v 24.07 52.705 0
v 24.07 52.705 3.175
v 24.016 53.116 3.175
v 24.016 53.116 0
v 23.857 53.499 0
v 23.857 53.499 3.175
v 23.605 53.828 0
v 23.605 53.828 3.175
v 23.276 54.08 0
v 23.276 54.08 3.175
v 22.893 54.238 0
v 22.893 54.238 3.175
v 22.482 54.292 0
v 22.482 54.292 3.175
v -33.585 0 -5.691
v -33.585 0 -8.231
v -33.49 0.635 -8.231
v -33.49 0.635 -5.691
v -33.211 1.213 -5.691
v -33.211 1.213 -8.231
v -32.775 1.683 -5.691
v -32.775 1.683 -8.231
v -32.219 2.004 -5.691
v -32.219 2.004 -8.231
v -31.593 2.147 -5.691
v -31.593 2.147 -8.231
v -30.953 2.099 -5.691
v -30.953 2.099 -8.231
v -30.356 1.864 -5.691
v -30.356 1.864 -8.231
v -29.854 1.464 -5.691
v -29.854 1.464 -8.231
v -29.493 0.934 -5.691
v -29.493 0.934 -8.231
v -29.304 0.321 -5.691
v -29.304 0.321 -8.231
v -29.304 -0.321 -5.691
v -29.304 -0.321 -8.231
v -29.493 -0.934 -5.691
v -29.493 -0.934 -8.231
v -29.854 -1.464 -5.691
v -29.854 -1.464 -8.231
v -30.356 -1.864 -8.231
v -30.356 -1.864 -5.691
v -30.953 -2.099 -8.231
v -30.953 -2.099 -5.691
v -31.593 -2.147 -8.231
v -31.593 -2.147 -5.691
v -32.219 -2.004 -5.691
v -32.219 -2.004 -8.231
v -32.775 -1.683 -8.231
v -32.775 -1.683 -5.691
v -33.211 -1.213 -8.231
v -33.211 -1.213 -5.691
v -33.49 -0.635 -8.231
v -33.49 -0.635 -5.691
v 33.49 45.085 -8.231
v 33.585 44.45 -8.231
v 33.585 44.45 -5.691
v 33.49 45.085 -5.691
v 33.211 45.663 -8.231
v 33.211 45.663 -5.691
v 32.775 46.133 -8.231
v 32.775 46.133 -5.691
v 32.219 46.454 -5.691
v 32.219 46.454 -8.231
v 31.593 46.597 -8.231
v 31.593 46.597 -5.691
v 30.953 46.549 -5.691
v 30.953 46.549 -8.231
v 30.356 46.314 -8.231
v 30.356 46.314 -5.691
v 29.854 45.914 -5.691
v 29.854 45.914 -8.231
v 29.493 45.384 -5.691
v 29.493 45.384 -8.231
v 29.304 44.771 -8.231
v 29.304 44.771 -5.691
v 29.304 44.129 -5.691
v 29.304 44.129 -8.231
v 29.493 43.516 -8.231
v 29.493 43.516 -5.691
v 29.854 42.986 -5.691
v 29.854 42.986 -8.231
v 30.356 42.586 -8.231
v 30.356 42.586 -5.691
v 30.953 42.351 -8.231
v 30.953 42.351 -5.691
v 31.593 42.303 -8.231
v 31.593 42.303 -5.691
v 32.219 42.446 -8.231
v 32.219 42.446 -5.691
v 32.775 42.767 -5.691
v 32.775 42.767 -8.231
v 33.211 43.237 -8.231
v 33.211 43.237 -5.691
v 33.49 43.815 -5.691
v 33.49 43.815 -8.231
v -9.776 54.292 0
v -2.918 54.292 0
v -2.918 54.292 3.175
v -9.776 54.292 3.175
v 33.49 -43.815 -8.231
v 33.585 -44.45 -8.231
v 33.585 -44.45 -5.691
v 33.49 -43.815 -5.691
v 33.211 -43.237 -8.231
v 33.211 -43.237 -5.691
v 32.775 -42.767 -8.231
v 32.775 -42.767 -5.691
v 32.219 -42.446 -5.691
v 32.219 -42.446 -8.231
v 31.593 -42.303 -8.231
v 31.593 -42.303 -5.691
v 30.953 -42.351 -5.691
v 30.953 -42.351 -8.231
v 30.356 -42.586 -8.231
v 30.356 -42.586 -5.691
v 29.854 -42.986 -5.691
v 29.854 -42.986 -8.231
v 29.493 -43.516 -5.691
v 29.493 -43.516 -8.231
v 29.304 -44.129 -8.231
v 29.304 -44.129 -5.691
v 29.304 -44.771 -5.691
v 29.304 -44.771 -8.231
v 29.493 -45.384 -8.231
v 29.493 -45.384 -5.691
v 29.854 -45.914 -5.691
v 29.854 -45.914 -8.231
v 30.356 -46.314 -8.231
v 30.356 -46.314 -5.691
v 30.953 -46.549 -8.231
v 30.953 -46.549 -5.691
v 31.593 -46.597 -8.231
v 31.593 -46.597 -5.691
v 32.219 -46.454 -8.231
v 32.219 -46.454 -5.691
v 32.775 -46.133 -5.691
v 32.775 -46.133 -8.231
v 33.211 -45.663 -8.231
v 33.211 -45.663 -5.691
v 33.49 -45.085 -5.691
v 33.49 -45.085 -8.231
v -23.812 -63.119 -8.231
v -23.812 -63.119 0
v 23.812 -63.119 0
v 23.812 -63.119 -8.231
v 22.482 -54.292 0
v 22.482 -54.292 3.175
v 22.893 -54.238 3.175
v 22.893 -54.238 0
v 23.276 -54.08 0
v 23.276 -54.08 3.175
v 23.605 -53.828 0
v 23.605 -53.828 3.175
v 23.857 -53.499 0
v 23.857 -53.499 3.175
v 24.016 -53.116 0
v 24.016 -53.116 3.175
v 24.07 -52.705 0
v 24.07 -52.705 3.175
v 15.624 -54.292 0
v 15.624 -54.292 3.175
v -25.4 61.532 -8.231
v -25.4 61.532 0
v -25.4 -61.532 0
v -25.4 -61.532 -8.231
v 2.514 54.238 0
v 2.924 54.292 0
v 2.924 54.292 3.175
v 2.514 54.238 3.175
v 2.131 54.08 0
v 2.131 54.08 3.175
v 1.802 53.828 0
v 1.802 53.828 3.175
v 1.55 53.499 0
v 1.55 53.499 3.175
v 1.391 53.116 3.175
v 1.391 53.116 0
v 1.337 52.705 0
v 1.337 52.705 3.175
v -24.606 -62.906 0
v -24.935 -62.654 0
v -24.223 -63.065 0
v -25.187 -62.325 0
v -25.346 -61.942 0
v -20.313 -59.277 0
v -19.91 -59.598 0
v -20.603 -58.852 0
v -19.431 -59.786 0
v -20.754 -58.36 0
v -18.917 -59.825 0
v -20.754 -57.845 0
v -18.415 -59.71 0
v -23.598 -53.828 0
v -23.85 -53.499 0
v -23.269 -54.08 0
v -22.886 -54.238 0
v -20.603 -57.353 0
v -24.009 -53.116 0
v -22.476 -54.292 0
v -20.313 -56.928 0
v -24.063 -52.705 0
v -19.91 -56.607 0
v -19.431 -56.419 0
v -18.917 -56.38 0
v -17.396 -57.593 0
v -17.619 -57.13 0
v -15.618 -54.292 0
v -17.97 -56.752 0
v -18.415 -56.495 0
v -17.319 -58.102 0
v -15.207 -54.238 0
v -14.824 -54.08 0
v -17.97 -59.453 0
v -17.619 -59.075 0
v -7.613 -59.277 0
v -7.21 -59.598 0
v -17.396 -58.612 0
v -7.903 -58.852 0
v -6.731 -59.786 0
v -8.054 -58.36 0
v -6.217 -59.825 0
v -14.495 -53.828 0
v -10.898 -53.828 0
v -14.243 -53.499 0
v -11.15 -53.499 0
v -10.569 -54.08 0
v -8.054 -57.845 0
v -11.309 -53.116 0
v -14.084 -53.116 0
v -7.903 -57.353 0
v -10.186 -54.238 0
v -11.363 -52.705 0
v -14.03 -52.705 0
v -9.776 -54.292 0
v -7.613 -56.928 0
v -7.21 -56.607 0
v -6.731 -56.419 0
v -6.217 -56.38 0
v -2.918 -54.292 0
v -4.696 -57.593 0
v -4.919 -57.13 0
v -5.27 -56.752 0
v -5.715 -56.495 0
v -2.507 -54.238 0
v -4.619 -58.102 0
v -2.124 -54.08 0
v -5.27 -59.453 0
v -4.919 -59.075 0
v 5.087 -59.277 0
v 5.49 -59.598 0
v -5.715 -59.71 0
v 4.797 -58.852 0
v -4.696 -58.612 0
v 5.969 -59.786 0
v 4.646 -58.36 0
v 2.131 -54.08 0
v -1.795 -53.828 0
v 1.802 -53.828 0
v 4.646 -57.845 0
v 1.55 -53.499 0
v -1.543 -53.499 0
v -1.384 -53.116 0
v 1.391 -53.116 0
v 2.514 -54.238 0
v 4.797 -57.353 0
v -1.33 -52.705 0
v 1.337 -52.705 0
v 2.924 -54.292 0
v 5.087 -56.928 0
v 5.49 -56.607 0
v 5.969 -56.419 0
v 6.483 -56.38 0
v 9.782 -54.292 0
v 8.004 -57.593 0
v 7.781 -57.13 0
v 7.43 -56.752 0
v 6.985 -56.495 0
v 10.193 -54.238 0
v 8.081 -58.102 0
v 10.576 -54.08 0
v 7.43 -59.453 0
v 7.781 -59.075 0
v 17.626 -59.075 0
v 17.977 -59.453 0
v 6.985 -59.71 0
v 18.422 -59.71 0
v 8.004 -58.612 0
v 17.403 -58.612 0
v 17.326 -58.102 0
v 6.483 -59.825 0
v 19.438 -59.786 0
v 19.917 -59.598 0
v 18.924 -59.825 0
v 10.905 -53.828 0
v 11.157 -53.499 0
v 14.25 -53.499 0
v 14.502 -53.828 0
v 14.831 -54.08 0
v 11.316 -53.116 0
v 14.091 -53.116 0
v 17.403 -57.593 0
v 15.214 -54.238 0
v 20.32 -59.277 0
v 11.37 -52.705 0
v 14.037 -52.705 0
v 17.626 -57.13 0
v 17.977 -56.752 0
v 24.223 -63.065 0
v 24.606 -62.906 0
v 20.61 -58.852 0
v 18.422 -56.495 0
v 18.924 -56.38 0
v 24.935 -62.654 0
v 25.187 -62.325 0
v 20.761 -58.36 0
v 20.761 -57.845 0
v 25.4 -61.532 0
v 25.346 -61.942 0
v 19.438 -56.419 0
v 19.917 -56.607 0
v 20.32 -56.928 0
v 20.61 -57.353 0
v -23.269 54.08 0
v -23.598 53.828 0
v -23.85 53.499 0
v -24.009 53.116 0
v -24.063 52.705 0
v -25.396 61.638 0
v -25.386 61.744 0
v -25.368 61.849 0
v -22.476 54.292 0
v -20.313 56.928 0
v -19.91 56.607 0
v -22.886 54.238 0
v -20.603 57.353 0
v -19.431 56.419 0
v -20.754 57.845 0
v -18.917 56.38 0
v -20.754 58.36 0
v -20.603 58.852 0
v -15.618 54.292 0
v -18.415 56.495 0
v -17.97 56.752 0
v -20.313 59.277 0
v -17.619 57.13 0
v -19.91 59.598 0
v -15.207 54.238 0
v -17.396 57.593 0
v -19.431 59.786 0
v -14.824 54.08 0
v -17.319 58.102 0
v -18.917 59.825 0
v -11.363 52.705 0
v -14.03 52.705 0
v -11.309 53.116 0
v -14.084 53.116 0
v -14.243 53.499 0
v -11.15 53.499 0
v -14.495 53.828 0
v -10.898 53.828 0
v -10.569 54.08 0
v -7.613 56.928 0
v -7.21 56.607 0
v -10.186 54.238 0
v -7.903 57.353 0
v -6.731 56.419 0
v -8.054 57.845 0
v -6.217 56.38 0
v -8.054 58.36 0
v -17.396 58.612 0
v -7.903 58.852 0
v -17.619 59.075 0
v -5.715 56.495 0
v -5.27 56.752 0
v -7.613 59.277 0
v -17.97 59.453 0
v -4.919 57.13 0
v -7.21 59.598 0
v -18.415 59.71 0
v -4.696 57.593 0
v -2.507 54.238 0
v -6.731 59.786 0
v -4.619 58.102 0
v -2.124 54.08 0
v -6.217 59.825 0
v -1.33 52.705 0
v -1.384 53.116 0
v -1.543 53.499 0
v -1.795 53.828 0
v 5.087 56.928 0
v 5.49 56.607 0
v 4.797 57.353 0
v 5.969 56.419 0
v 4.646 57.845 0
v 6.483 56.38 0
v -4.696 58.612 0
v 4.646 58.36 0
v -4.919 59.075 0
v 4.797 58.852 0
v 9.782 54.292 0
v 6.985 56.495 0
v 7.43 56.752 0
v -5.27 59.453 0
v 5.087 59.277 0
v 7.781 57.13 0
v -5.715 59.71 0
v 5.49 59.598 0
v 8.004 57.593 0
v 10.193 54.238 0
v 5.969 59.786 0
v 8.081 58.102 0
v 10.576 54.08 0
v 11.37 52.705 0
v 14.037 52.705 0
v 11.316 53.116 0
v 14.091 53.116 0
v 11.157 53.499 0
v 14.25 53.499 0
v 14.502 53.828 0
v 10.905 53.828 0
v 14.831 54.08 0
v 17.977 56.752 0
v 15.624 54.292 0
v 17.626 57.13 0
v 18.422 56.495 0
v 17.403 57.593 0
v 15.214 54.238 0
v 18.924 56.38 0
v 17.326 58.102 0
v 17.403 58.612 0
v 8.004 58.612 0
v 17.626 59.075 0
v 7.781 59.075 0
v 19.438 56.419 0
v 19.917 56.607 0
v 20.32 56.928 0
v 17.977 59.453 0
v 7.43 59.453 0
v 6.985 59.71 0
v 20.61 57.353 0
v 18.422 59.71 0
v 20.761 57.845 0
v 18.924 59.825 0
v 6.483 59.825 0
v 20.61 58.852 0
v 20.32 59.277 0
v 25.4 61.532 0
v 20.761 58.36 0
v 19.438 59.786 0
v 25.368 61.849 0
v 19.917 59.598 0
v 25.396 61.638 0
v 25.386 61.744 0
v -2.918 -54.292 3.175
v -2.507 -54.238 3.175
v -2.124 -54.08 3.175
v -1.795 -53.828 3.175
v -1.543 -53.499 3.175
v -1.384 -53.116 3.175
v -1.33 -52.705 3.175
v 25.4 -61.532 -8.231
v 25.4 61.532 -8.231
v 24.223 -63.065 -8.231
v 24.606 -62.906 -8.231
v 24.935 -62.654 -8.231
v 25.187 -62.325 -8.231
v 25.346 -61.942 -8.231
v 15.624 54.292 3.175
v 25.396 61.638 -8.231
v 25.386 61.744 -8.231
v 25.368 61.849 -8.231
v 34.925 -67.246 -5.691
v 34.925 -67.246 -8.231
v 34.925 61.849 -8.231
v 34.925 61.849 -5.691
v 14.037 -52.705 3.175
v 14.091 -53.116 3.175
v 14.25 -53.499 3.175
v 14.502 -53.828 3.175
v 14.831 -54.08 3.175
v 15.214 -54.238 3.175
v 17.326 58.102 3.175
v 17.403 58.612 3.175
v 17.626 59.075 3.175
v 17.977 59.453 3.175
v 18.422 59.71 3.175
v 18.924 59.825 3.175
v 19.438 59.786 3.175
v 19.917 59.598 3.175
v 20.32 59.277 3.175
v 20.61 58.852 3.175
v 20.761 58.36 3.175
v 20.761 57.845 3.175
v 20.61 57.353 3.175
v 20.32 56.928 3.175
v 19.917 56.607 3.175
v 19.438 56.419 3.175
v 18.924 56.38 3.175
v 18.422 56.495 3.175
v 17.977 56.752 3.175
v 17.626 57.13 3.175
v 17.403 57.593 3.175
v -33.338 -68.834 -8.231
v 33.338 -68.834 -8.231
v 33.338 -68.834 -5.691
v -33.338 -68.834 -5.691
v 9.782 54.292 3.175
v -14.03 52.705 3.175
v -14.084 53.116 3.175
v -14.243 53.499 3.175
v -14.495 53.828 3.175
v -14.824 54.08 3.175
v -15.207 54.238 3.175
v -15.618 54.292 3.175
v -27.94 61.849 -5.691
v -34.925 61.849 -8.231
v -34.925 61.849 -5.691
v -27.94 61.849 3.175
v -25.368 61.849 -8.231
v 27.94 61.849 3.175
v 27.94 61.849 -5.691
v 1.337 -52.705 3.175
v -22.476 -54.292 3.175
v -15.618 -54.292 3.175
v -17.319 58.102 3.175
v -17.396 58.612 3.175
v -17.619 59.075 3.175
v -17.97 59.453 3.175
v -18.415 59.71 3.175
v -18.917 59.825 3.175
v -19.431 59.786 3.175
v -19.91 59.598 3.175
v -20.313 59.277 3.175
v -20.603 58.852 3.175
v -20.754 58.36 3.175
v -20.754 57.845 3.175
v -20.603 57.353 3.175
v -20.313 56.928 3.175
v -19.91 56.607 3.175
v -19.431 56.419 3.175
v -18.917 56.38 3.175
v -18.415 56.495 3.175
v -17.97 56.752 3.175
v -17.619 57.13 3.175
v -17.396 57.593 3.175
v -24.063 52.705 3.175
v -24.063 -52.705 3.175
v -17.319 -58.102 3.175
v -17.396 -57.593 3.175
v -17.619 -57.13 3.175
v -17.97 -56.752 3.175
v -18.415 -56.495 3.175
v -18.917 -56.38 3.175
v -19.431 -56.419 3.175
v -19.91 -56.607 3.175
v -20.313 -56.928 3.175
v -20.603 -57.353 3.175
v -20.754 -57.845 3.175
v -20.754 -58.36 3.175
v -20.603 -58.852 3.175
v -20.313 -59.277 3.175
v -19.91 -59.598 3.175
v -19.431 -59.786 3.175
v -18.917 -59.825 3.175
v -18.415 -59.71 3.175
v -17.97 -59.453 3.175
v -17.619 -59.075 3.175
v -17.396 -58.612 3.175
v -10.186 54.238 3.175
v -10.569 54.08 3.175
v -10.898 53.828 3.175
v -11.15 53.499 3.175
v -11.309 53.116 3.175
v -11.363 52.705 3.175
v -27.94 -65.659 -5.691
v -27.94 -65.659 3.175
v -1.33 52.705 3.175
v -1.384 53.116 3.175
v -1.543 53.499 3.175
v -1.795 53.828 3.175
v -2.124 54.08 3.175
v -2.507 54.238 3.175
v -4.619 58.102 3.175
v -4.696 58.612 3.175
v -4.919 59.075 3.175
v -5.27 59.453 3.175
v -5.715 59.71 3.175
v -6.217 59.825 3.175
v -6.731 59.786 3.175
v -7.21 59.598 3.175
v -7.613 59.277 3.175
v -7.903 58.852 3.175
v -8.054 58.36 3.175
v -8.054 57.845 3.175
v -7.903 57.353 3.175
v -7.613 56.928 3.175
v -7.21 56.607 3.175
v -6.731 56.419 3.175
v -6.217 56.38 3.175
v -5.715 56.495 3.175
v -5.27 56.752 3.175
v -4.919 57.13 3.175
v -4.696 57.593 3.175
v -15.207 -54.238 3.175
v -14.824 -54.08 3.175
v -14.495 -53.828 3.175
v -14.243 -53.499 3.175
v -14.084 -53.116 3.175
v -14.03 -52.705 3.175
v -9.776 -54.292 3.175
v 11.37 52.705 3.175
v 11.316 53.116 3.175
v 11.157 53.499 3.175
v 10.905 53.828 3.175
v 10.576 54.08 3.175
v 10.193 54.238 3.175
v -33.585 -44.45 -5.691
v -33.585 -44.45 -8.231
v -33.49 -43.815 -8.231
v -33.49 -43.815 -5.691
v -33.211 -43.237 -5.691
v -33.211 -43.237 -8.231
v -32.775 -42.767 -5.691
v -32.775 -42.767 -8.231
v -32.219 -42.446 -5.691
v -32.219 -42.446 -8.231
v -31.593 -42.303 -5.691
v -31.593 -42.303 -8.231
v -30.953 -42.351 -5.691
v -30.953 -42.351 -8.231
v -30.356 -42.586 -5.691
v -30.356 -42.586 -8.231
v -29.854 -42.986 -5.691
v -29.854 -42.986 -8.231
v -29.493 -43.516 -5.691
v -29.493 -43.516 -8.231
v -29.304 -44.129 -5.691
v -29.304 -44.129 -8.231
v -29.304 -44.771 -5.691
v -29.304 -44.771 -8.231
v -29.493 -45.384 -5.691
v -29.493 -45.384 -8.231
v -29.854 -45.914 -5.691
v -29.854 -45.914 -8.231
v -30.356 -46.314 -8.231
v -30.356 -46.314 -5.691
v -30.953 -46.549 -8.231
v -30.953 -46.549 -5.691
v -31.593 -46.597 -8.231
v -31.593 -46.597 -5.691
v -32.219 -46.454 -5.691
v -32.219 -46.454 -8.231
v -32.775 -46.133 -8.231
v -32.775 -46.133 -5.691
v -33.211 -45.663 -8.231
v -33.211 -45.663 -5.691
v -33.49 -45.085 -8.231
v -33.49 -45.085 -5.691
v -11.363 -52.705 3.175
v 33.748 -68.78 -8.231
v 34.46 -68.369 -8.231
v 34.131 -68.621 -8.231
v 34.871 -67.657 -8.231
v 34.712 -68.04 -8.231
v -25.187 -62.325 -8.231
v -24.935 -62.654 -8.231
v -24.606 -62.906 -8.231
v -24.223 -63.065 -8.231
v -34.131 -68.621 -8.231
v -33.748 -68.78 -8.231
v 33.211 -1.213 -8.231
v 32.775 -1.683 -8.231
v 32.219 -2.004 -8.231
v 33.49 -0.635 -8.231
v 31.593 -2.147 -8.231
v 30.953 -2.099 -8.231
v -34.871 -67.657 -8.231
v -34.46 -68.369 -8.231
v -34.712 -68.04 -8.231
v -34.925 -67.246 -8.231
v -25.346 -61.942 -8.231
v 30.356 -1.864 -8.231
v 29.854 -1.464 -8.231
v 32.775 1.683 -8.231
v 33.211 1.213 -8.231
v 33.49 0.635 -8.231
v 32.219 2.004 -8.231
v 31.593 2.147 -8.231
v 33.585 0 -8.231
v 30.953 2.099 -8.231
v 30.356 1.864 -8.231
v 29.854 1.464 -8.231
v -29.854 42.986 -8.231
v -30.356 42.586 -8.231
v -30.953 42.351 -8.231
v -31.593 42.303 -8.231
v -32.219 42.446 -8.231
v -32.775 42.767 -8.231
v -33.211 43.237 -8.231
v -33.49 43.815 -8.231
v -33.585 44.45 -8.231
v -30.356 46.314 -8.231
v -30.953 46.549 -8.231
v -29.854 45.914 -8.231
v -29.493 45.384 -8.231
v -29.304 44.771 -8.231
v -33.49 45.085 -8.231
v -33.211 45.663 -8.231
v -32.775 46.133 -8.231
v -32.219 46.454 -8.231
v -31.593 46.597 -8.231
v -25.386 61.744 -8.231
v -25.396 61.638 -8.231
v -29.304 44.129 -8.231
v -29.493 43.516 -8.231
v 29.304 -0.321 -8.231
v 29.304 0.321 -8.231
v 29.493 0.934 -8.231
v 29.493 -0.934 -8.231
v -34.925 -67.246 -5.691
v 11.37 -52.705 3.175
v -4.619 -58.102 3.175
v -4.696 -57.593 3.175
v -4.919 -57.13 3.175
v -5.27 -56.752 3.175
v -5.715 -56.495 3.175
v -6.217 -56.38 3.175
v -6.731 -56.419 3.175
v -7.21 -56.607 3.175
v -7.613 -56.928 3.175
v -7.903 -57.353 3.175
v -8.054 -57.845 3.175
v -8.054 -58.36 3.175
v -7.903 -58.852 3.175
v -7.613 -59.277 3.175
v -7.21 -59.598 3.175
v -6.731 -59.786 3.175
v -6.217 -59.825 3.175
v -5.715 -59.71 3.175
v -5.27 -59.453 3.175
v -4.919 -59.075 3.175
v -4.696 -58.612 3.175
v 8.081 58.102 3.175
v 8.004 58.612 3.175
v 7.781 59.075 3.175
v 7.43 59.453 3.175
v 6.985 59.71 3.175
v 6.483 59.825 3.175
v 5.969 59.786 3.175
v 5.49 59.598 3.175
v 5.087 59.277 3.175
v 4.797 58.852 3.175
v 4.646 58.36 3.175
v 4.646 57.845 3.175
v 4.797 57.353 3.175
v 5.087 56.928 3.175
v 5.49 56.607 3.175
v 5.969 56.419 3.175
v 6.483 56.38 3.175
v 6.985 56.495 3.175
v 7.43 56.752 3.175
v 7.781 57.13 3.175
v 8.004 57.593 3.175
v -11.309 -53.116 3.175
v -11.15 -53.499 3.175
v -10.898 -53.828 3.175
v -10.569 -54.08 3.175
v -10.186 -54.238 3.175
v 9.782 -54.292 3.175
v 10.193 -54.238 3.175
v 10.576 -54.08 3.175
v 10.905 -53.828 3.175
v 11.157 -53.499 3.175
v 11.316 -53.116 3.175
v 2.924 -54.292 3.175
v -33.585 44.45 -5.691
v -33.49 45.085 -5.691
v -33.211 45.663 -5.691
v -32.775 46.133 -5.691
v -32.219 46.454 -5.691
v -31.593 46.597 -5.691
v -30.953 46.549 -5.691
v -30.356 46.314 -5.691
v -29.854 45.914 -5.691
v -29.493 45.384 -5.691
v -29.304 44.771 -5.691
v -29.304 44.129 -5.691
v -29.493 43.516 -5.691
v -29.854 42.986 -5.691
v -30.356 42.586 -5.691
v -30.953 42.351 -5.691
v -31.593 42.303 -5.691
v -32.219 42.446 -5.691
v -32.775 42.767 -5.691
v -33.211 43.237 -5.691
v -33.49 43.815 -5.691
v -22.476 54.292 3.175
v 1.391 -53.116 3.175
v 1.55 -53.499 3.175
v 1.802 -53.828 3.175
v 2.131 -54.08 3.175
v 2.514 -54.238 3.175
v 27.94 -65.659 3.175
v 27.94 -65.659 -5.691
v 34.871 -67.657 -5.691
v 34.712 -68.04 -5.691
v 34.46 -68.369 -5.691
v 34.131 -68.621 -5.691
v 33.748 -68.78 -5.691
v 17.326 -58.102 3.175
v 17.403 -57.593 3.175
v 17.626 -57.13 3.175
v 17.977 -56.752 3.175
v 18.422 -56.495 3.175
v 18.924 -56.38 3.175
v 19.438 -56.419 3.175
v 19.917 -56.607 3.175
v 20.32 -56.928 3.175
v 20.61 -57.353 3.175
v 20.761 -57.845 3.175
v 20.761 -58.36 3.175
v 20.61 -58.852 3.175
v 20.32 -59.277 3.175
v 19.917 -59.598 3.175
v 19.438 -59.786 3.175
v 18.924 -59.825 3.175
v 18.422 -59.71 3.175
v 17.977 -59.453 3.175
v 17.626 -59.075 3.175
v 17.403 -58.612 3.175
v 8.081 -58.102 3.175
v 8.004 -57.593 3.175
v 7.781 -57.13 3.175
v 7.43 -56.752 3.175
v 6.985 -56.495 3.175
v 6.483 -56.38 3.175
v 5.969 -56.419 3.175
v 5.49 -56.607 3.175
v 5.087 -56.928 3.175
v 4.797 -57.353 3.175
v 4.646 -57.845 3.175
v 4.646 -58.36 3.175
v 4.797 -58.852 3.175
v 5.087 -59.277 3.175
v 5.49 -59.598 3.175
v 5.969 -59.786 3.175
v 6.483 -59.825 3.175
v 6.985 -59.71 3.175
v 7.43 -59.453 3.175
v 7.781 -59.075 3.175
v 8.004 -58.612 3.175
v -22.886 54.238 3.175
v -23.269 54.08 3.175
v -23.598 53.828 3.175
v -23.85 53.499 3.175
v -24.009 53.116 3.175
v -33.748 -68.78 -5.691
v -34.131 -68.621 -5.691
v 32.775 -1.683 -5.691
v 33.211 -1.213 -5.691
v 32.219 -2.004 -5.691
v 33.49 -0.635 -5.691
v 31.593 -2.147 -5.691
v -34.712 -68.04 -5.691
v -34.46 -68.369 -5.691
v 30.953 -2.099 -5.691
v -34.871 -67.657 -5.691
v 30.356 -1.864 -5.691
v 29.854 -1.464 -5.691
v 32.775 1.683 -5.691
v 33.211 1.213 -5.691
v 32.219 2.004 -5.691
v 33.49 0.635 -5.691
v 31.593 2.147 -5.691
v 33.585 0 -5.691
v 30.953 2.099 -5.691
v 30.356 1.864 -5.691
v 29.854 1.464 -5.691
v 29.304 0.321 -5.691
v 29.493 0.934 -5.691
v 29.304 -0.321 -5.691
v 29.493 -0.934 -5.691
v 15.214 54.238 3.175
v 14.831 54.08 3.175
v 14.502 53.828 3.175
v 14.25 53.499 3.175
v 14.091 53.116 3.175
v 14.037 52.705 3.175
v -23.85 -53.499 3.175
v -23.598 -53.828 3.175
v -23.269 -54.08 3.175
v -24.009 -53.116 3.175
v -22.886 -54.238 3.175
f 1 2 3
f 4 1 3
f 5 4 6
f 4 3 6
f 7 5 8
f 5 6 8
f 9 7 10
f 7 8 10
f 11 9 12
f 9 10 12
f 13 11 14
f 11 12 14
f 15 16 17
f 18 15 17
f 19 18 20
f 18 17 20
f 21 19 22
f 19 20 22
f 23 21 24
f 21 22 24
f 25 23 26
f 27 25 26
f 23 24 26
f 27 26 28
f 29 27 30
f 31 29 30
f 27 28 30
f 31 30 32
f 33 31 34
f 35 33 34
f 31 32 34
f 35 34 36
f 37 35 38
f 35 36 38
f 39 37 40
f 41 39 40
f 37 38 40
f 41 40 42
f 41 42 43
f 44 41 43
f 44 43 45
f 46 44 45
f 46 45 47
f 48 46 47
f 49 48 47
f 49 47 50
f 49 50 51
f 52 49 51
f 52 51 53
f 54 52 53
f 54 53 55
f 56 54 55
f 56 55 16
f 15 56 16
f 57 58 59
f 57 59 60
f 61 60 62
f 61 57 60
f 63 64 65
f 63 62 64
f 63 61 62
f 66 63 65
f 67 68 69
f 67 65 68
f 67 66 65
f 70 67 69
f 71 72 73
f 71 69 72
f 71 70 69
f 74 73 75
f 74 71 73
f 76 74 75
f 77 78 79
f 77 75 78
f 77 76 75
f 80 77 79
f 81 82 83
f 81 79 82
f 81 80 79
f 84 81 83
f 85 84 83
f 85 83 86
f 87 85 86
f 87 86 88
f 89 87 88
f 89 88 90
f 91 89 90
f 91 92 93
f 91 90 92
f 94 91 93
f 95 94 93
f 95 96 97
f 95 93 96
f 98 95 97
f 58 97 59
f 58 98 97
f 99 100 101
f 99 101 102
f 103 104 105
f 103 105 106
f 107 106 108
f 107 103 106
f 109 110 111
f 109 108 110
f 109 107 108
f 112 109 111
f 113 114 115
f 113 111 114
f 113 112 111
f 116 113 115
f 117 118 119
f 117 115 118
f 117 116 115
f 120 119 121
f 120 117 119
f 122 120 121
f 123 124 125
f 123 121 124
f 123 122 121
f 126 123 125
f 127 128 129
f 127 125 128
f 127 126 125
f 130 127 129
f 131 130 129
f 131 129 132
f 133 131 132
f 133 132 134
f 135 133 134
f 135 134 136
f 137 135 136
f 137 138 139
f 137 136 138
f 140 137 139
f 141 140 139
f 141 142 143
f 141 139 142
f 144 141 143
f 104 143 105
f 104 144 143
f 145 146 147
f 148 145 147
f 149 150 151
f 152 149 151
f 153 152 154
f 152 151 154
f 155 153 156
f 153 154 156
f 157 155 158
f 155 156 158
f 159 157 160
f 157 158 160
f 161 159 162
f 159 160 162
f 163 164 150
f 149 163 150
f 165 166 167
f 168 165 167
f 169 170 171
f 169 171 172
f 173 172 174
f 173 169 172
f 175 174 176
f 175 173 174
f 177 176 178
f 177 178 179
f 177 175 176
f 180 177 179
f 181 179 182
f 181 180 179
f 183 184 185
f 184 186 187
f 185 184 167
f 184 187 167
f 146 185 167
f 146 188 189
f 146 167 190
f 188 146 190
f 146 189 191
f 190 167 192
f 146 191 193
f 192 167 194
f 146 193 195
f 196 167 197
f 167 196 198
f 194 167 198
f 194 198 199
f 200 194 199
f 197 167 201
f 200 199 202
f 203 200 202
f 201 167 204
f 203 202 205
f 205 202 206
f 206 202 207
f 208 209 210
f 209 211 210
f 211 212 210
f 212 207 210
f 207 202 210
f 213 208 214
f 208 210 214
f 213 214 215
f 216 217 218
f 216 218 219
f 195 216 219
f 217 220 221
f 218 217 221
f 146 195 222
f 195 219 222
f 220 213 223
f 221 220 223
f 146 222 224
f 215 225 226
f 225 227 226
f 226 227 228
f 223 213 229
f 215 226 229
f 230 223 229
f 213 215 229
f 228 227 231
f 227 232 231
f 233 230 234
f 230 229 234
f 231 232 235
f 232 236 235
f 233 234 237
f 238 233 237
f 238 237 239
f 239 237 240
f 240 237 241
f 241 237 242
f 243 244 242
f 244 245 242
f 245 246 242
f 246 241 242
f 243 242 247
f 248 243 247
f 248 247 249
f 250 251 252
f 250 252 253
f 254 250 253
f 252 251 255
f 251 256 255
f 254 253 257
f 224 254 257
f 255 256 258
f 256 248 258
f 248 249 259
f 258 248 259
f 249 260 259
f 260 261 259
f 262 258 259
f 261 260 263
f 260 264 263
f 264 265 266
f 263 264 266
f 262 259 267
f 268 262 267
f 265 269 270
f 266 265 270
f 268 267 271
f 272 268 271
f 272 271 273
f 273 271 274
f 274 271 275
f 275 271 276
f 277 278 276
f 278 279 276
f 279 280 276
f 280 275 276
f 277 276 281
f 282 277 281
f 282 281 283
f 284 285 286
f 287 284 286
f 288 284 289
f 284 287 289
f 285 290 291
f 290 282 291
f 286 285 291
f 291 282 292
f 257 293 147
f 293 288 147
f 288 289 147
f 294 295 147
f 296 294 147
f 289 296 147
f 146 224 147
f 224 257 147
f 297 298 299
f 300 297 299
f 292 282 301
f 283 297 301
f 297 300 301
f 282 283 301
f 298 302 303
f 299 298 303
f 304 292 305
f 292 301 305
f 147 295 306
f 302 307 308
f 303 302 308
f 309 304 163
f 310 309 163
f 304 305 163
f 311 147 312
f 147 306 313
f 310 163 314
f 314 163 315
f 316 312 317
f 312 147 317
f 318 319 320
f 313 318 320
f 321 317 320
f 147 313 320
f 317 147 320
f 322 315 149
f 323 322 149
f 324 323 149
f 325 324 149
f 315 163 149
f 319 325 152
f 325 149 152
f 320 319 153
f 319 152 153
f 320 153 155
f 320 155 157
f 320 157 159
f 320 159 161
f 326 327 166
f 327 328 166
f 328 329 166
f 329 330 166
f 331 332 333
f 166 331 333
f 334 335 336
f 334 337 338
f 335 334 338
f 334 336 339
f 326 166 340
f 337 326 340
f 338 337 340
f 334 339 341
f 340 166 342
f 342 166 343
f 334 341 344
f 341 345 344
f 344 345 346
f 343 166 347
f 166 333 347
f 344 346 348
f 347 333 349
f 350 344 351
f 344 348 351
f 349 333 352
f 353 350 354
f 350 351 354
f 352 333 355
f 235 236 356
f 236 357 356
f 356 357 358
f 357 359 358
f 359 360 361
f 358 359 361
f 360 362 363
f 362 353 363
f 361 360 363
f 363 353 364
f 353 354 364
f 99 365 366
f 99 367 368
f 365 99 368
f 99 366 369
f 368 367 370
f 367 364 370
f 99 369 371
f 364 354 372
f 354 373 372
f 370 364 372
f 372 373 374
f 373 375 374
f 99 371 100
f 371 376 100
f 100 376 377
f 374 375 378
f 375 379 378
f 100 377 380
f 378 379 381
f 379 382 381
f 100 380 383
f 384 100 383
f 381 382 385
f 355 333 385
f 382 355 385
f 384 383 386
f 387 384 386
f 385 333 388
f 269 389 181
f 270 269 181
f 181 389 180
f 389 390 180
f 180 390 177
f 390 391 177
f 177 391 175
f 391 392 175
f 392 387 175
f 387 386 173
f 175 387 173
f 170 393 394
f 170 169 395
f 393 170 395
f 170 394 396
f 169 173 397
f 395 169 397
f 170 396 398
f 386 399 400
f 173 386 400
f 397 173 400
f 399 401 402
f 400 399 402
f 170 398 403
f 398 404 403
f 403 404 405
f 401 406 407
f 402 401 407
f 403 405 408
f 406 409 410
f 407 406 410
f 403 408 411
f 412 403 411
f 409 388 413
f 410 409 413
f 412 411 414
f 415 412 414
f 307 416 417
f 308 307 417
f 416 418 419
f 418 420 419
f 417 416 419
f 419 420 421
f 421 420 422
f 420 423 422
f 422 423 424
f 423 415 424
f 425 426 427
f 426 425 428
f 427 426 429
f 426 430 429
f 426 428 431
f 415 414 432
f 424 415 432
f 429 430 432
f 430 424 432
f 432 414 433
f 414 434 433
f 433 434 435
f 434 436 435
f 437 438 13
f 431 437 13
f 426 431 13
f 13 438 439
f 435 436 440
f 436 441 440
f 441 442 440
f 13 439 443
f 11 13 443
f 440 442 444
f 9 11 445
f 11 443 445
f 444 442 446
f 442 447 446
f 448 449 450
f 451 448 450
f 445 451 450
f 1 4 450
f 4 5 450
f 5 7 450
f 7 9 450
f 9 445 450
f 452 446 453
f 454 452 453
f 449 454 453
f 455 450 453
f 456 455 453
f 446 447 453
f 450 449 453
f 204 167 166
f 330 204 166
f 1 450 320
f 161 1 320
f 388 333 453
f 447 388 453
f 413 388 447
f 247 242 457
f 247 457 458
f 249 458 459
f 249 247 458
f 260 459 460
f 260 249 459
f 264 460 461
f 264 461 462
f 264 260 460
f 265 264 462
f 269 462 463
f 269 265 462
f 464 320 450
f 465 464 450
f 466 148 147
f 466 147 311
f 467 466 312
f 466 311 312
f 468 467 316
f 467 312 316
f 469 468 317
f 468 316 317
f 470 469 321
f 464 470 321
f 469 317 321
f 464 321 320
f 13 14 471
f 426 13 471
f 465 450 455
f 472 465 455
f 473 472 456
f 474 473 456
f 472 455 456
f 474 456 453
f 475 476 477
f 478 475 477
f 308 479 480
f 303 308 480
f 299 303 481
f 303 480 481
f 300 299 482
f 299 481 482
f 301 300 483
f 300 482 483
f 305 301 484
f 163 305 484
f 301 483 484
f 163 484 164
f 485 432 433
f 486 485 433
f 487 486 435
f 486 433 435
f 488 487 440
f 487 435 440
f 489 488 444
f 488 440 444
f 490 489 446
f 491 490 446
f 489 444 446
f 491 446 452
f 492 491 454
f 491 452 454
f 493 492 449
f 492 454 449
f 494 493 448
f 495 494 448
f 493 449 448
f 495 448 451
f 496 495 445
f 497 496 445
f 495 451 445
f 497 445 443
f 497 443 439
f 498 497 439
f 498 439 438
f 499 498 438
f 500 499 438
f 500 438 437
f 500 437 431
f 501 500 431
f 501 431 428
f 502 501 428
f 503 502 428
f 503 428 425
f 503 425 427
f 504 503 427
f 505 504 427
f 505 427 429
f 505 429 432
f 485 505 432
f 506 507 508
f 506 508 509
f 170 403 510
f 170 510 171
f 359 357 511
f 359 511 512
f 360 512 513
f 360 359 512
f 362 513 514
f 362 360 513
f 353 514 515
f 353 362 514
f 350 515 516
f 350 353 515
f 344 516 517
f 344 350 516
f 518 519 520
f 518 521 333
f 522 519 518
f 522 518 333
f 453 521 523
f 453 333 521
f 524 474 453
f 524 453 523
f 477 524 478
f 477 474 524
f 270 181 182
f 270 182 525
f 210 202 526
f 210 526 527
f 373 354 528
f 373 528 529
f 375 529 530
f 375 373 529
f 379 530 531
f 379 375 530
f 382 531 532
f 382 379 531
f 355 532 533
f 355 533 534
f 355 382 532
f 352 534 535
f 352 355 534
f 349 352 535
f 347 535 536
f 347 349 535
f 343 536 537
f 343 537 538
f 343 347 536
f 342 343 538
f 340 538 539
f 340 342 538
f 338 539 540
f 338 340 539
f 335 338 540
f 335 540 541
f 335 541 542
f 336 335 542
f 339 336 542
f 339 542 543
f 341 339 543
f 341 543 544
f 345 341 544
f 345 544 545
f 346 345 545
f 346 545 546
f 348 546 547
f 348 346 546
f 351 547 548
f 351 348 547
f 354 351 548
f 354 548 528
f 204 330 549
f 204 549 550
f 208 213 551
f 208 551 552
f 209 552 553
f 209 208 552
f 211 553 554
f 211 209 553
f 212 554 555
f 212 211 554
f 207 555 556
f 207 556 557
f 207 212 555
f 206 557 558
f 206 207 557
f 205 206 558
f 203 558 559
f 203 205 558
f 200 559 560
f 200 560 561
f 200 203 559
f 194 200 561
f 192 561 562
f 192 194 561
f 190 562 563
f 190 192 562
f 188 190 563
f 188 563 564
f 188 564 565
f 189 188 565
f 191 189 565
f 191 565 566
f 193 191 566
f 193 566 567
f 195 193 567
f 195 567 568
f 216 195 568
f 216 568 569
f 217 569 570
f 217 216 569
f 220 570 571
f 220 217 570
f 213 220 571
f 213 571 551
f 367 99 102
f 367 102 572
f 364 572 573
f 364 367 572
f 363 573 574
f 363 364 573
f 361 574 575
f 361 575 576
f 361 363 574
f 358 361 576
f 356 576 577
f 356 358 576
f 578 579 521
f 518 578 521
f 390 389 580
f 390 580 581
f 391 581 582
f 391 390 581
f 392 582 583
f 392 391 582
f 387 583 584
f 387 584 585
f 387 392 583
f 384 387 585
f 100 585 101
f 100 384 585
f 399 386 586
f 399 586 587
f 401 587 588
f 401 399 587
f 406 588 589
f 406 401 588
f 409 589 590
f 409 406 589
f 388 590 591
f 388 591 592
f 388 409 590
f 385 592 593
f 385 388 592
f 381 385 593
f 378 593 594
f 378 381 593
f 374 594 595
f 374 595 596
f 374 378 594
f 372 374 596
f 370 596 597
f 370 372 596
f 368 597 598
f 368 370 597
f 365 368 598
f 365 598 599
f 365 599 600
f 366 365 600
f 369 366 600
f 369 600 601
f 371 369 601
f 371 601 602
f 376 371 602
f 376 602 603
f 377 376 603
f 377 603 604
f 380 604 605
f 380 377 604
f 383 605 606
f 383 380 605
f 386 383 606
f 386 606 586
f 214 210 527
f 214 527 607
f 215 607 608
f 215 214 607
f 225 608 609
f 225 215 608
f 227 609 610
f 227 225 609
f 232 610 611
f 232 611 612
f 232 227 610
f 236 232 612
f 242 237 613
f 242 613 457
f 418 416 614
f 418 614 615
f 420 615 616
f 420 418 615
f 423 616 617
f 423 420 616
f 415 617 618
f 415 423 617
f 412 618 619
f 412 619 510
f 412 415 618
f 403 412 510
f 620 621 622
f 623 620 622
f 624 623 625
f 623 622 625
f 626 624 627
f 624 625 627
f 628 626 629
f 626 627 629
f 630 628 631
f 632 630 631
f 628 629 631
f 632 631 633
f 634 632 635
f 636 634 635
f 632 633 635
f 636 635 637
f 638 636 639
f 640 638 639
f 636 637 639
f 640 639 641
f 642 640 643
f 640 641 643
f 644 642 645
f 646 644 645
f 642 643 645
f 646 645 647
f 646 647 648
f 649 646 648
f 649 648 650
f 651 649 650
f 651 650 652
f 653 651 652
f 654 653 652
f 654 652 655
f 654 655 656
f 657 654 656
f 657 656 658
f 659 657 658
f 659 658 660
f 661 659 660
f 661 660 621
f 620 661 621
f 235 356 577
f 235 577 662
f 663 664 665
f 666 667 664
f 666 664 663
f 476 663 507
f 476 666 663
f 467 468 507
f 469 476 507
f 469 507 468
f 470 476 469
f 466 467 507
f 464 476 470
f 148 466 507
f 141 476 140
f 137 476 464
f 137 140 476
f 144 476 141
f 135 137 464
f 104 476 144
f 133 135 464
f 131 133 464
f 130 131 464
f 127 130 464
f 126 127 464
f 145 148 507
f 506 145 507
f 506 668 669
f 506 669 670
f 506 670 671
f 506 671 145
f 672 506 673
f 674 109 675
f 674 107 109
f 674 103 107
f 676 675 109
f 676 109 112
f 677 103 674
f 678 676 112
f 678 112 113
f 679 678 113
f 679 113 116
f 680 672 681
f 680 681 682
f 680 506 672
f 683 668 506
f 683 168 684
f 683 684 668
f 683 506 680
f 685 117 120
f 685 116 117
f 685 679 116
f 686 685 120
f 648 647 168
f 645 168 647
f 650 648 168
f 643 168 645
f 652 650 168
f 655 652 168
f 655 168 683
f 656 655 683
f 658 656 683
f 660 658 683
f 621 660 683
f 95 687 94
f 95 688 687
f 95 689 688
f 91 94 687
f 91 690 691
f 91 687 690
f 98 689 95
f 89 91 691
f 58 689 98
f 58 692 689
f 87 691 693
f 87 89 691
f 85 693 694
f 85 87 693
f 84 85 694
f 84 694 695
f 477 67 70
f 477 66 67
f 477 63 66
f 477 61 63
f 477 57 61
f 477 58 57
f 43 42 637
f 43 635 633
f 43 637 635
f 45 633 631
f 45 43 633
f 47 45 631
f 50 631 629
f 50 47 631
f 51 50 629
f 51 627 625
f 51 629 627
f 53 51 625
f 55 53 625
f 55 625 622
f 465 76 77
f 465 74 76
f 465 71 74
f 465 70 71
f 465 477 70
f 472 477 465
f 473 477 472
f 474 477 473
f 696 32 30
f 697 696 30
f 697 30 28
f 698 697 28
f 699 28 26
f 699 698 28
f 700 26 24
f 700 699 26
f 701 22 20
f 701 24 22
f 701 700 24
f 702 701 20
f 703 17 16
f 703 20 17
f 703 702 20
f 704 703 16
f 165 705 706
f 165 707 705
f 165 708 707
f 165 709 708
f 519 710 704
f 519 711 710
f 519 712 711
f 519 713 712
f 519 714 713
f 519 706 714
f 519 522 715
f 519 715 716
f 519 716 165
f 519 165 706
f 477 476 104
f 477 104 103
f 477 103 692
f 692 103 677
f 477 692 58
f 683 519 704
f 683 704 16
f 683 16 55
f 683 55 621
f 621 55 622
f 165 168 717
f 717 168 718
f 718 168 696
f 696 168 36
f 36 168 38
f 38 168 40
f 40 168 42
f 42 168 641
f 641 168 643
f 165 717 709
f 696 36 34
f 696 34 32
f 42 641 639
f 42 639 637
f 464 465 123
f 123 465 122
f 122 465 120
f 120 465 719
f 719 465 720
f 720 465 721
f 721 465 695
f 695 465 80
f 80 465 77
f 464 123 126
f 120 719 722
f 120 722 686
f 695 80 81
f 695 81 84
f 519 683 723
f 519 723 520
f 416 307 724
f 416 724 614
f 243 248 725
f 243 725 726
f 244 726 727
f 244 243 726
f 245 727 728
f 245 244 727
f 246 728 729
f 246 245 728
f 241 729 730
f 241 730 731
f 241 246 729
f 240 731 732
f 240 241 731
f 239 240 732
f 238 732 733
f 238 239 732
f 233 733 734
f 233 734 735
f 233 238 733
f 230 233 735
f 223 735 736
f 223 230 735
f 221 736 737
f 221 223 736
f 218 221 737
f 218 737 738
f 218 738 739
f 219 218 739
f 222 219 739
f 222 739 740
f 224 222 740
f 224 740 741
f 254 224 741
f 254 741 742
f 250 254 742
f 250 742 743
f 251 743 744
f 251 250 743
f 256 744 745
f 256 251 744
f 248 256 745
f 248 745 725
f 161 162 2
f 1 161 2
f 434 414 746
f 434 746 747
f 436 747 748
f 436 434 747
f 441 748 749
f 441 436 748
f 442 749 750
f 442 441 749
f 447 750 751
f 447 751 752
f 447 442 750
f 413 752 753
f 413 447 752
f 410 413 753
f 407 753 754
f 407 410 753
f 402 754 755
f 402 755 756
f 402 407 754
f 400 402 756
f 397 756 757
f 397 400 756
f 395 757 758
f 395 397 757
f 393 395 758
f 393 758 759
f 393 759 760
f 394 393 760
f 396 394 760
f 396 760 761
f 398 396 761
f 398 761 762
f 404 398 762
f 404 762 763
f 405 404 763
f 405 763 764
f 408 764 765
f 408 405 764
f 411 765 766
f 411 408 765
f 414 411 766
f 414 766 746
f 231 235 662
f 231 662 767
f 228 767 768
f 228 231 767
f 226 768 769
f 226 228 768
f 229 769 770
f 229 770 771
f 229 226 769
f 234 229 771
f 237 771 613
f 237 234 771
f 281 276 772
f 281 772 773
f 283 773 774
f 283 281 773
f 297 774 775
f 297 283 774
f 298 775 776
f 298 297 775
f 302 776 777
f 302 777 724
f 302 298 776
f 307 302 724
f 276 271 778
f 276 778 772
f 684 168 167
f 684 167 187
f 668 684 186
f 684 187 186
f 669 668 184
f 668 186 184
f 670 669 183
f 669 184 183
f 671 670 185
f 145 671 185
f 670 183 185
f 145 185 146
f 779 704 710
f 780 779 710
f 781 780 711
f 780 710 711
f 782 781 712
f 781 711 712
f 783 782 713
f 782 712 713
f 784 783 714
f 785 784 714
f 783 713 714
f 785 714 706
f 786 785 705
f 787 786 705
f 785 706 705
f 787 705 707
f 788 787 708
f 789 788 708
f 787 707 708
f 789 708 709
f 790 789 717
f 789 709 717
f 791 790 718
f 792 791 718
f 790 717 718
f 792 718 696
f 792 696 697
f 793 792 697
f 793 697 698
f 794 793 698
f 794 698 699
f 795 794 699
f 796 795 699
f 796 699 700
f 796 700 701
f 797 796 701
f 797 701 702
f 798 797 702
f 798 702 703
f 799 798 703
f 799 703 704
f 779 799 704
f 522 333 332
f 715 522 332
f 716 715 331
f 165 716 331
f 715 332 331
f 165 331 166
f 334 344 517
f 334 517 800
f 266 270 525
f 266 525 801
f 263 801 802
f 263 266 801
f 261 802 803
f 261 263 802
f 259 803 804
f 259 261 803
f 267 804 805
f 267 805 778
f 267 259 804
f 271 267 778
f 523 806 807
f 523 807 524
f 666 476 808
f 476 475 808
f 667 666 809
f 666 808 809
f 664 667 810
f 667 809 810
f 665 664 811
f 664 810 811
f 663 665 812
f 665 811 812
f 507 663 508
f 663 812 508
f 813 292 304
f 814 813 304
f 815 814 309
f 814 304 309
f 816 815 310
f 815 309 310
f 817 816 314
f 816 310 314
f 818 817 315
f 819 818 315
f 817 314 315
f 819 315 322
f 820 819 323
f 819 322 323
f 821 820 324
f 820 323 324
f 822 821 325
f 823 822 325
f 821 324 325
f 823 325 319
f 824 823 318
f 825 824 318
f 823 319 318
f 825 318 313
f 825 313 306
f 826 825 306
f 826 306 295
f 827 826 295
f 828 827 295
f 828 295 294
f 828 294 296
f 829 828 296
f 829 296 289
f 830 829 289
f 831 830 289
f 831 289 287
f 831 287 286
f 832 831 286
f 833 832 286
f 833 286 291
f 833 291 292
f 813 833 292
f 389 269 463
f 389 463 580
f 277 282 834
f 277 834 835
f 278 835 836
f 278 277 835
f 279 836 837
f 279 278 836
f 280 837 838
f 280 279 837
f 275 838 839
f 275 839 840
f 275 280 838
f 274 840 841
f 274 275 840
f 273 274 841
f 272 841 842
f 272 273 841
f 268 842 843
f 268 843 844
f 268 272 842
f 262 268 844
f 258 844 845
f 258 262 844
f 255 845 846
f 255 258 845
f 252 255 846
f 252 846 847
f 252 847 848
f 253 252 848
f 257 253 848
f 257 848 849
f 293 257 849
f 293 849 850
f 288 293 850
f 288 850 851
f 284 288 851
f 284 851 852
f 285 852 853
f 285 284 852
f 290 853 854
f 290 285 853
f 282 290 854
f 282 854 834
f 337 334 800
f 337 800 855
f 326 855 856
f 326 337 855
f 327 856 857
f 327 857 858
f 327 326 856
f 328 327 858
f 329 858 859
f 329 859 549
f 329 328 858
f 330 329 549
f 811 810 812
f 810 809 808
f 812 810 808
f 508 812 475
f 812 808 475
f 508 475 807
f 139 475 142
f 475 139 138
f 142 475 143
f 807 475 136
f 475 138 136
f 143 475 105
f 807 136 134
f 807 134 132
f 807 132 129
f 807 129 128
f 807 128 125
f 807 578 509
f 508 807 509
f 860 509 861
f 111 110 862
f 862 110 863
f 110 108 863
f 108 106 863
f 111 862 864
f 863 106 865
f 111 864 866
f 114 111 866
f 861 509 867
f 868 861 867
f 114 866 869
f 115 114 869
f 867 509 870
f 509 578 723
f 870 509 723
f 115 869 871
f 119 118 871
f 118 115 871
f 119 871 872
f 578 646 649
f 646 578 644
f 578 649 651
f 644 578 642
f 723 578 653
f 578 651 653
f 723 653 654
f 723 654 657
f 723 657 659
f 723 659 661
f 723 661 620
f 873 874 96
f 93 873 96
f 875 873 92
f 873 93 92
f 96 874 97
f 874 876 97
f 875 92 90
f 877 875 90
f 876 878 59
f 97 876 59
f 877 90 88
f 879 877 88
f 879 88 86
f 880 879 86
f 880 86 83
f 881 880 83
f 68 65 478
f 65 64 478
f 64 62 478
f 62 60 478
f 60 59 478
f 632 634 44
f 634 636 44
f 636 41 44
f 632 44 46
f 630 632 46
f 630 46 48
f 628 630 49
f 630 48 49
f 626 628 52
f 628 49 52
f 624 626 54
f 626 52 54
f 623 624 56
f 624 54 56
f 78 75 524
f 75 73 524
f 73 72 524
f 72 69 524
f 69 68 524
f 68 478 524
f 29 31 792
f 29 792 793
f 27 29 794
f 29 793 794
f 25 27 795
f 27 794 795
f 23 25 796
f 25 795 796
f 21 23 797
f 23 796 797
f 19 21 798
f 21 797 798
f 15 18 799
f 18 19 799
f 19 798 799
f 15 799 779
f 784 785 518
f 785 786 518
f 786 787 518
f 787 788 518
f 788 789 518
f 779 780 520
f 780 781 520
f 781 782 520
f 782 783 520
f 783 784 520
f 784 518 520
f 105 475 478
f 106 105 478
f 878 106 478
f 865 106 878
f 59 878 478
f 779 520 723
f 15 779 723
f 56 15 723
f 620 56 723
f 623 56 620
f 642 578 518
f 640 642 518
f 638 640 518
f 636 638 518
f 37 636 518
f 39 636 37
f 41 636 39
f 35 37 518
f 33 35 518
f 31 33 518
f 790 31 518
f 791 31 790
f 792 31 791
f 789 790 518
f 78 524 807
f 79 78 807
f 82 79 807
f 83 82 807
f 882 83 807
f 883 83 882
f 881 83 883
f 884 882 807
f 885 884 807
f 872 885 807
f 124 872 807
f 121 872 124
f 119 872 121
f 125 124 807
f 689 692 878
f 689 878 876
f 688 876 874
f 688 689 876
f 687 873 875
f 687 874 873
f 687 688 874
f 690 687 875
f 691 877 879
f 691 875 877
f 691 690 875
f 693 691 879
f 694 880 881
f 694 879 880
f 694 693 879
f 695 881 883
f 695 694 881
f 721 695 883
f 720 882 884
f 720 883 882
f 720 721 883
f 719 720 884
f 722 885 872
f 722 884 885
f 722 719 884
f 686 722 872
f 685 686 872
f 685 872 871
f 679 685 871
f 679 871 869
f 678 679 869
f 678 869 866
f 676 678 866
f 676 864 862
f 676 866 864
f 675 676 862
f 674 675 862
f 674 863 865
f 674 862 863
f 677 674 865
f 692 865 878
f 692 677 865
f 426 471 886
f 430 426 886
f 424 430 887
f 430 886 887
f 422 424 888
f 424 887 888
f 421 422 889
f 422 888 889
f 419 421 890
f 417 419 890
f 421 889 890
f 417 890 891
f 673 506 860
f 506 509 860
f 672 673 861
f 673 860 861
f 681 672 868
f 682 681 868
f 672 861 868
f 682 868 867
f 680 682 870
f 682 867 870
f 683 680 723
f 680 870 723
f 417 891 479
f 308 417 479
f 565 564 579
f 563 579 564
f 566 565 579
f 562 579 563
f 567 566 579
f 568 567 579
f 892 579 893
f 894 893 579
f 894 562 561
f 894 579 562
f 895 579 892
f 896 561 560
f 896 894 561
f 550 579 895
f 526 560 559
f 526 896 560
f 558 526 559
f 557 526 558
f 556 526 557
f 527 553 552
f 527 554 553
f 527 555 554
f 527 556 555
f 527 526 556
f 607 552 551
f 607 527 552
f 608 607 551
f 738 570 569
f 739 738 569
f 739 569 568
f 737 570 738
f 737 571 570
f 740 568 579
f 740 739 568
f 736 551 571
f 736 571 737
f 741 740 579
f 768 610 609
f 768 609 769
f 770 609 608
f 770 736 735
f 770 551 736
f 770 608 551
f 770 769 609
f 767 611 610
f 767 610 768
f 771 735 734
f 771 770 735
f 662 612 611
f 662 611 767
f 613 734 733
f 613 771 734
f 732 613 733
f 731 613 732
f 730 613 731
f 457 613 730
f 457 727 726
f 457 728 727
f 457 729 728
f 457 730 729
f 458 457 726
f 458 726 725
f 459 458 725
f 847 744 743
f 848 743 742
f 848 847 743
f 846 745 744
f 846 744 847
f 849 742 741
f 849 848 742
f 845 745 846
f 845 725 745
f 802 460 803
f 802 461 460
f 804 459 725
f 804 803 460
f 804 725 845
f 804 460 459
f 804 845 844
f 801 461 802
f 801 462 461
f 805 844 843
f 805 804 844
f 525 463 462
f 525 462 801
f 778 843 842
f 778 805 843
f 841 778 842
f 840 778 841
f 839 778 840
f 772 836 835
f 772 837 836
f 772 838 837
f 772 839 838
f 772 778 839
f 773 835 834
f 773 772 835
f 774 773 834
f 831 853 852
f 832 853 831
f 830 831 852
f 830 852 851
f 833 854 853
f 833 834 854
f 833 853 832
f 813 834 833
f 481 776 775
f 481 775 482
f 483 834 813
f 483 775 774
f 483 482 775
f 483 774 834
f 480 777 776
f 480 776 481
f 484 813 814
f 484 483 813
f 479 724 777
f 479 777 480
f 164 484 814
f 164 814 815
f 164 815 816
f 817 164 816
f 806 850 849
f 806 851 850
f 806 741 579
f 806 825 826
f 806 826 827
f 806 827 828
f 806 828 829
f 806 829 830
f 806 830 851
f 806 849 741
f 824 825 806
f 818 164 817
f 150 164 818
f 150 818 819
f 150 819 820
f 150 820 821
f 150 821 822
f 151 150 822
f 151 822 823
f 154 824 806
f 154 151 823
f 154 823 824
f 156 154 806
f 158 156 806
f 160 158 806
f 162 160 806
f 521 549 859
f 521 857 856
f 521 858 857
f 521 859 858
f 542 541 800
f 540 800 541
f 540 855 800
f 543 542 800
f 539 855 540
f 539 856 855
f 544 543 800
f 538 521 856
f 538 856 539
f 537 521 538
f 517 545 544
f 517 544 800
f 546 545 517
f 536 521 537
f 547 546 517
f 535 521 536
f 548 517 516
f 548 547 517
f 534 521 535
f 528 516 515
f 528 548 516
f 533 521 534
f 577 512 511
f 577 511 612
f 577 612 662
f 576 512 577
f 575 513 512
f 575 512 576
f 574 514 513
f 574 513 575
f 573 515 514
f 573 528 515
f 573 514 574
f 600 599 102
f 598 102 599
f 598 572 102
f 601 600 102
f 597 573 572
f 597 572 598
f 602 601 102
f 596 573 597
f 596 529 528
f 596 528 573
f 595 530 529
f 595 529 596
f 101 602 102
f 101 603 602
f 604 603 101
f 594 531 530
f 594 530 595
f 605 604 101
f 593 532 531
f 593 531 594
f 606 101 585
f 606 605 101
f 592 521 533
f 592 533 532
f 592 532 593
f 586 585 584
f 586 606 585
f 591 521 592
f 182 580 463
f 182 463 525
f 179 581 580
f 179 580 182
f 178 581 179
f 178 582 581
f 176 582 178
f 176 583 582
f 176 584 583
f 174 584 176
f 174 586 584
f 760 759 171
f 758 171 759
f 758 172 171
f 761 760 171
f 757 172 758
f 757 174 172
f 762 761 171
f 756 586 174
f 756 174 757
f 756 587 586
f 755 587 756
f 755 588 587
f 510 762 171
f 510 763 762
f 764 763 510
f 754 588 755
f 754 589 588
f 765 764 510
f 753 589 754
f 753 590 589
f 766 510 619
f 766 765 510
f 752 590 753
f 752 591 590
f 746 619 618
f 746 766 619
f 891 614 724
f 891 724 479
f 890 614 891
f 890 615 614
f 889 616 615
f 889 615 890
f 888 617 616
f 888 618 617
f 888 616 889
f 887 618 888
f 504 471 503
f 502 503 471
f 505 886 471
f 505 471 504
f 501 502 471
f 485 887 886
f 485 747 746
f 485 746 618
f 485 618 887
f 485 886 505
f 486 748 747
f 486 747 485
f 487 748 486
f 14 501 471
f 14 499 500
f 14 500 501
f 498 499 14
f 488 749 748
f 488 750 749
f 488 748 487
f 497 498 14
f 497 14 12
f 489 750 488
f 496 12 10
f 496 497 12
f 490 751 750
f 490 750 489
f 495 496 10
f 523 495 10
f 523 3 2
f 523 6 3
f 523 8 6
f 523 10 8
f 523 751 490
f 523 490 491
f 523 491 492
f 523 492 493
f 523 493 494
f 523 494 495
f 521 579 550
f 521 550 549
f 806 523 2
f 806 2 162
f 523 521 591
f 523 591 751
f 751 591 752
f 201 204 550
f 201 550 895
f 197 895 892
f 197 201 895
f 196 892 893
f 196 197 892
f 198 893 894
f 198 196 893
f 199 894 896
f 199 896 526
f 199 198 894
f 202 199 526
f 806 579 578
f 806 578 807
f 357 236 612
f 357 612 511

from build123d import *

# Parameters (mm, degrees)
SKETCH1_W                 = 50.8
SKETCH1_H                 = 126.238
BACK_DEPTH                = 3.175
CUT_EXTRUDE3_DEPTH        = 69.11203114
F_4_CLEARANCE_HOLE1_D     = 3.4544
LPATTERN1_OUTLINE_R       = 1.7272
LPATTERN1_DEPTH           = 3.175
SKETCH9_W                 = 55.88
SKETCH9_H                 = 131.318
WALLS_DEPTH               = 11.405821857
SKETCH11_W                = 69.85
SKETCH11_H                = 137.668
SKETCH11_W_2              = 50.8
SKETCH11_H_2              = 126.238
LIP_DEPTH                 = 2.54
F_6_CLEARANCE_OVERSIZED_D = 4.3053
FILLET2_R                 = 1.5875
CUT_EXTRUDE4_DEPTH        = 6.858
CUT_EXTRUDE4_DEPTH_BACK   = 3.81
SKETCH19_W                = 76.814856898
SKETCH19_H                = 21.095936882


# Read off the part's stored shape, not the designer's step: LPattern1
with BuildPart() as part:
    # Sketch1 → back (new body)
    with BuildSketch(Plane.XY):
        Rectangle(SKETCH1_W, SKETCH1_H)
    extrude(amount=BACK_DEPTH)

    # Sketch6 → Cut-Extrude3 (cut, through all)
    with BuildSketch(Plane.XY.offset(3.175)):
        with BuildLine():
            Line((24.07, -52.705), (24.07, 52.705))
            ThreePointArc((24.07, 52.705), (23.605032015, 53.827532015), (22.4825, 54.2925))
            Line((22.4825, 54.2925), (15.6245, 54.2925))
            ThreePointArc((15.6245, 54.2925), (14.501967985, 53.827532015), (14.037, 52.705))
            Line((14.037, 52.705), (14.037, -52.705))
            ThreePointArc((14.037, -52.705), (14.501967985, -53.827532015), (15.6245, -54.2925))
            Line((15.6245, -54.2925), (22.4825, -54.2925))
            ThreePointArc((22.4825, -54.2925), (23.605032015, -53.827532015), (24.07, -52.705))
        make_face()
    extrude(amount=-CUT_EXTRUDE3_DEPTH, mode=Mode.SUBTRACT)

    # #4 Clearance Hole1 (through all)
    with Locations(Plane(origin=(19.0535, 58.1025, 3.175), x_dir=(1, 0, 0), z_dir=(0, 0, 1))):
        with Locations((0, 0), (0, -116.205)):
            Hole(F_4_CLEARANCE_HOLE1_D / 2)

    # LPattern1 outline → LPattern1 (cut)
    with BuildSketch(Plane.XY):
        with BuildLine():
            ThreePointArc((1.337, -52.705), (1.801967985, -53.827532015), (2.9245, -54.2925))
            Line((2.9245, -54.2925), (9.7825, -54.2925))
            ThreePointArc((9.7825, -54.2925), (10.905032015, -53.827532015), (11.37, -52.705))
            Line((11.37, -52.705), (11.37, 52.705))
            ThreePointArc((11.37, 52.705), (10.905032015, 53.827532015), (9.7825, 54.2925))
            Line((9.7825, 54.2925), (2.9245, 54.2925))
            ThreePointArc((2.9245, 54.2925), (1.801967985, 53.827532015), (1.337, 52.705))
            Line((1.337, 52.705), (1.337, -52.705))
        make_face()
        with BuildLine():
            ThreePointArc((-11.363, -52.705), (-10.898032015, -53.827532015), (-9.7755, -54.2925))
            Line((-9.7755, -54.2925), (-2.9175, -54.2925))
            ThreePointArc((-2.9175, -54.2925), (-1.794967985, -53.827532015), (-1.33, -52.705))
            Line((-1.33, -52.705), (-1.33, 52.705))
            ThreePointArc((-1.33, 52.705), (-1.794967985, 53.827532015), (-2.9175, 54.2925))
            Line((-2.9175, 54.2925), (-9.7755, 54.2925))
            ThreePointArc((-9.7755, 54.2925), (-10.898032015, 53.827532015), (-11.363, 52.705))
            Line((-11.363, 52.705), (-11.363, -52.705))
        make_face()
        with BuildLine():
            ThreePointArc((-24.063, -52.705), (-23.598032015, -53.827532015), (-22.4755, -54.2925))
            Line((-22.4755, -54.2925), (-15.6175, -54.2925))
            ThreePointArc((-15.6175, -54.2925), (-14.494967985, -53.827532015), (-14.03, -52.705))
            Line((-14.03, -52.705), (-14.03, 52.705))
            ThreePointArc((-14.03, 52.705), (-14.494967985, 53.827532015), (-15.6175, 54.2925))
            Line((-15.6175, 54.2925), (-22.4755, 54.2925))
            ThreePointArc((-22.4755, 54.2925), (-23.598032015, 53.827532015), (-24.063, 52.705))
            Line((-24.063, 52.705), (-24.063, -52.705))
        make_face()
        with Locations((6.3535, -58.1025)):
            Circle(LPATTERN1_OUTLINE_R)
        with Locations((-6.3465, -58.1025)):
            Circle(LPATTERN1_OUTLINE_R)
        with Locations((-19.0465, -58.1025)):
            Circle(LPATTERN1_OUTLINE_R)
        with Locations((6.3535, 58.1025)):
            Circle(LPATTERN1_OUTLINE_R)
        with Locations((-6.3465, 58.1025)):
            Circle(LPATTERN1_OUTLINE_R)
        with Locations((-19.0465, 58.1025)):
            Circle(LPATTERN1_OUTLINE_R)
    extrude(amount=LPATTERN1_DEPTH, mode=Mode.SUBTRACT)

    # Sketch9 → walls (add)
    with BuildSketch(Plane.XY.offset(3.175)):
        Rectangle(SKETCH9_W, SKETCH9_H)
        with BuildLine():
            Line((25.4, -61.5315), (25.4, 61.5315))
            ThreePointArc((25.4, 61.5315), (24.935032015, 62.654032015), (23.8125, 63.119))
            Line((23.8125, 63.119), (-23.8125, 63.119))
            ThreePointArc((-23.8125, 63.119), (-24.935032015, 62.654032015), (-25.4, 61.5315))
            Line((-25.4, 61.5315), (-25.4, -61.5315))
            ThreePointArc((-25.4, -61.5315), (-24.935032015, -62.654032015), (-23.8125, -63.119))
            Line((-23.8125, -63.119), (23.8125, -63.119))
            ThreePointArc((23.8125, -63.119), (24.935032015, -62.654032015), (25.4, -61.5315))
        make_face(mode=Mode.SUBTRACT)
    extrude(amount=-WALLS_DEPTH)

    # Sketch11 → lip (add)
    with BuildSketch(Plane(origin=(0, 0, -8.230821857), x_dir=(-1, 0, 0), z_dir=(0, 0, -1))):
        Rectangle(SKETCH11_W, SKETCH11_H)
        Rectangle(SKETCH11_W_2, SKETCH11_H_2, mode=Mode.SUBTRACT)
    extrude(amount=-LIP_DEPTH)

    # #6 Clearance OVERSIZED (through all)
    with Locations(Plane(origin=(-31.4325, 44.45, -5.690821857), x_dir=(1, 0, 0), z_dir=(0, 0, 1))):
        with Locations((0, 0), (0, -44.45), (0, -88.9)):
            f_6_clearance_oversized = Hole(F_6_CLEARANCE_OVERSIZED_D / 2)

    # Fillet2
    fillet2_edges = [part.edges().sort_by_distance(p)[0] for p in [
        (34.925, 68.834, -6.960821857),
        (-34.925, 68.834, -6.960821857),
        (-34.925, -68.834, -6.960821857),
        (34.925, -68.834, -6.960821857),
    ]]
    fillet(fillet2_edges, radius=FILLET2_R)

    # Mirror2: #6 Clearance OVERSIZED across plane
    add(f_6_clearance_oversized.mirror(Plane(origin=(0, 0, 0), x_dir=(0, 0, 1), z_dir=(1, 0, 0))), mode=Mode.SUBTRACT)

    # Sketch19 → Cut-Extrude4 (cut, two sides: drawn at the far end of the back side and taken through both)
    with BuildSketch(Plane(origin=(0, 65.659, 0), x_dir=(1, 0, 0), z_dir=(0, 1, 0)).offset(-CUT_EXTRUDE4_DEPTH_BACK)):
        Rectangle(SKETCH19_W, SKETCH19_H)
    extrude(amount=CUT_EXTRUDE4_DEPTH + CUT_EXTRUDE4_DEPTH_BACK, mode=Mode.SUBTRACT)


solid = part.part
